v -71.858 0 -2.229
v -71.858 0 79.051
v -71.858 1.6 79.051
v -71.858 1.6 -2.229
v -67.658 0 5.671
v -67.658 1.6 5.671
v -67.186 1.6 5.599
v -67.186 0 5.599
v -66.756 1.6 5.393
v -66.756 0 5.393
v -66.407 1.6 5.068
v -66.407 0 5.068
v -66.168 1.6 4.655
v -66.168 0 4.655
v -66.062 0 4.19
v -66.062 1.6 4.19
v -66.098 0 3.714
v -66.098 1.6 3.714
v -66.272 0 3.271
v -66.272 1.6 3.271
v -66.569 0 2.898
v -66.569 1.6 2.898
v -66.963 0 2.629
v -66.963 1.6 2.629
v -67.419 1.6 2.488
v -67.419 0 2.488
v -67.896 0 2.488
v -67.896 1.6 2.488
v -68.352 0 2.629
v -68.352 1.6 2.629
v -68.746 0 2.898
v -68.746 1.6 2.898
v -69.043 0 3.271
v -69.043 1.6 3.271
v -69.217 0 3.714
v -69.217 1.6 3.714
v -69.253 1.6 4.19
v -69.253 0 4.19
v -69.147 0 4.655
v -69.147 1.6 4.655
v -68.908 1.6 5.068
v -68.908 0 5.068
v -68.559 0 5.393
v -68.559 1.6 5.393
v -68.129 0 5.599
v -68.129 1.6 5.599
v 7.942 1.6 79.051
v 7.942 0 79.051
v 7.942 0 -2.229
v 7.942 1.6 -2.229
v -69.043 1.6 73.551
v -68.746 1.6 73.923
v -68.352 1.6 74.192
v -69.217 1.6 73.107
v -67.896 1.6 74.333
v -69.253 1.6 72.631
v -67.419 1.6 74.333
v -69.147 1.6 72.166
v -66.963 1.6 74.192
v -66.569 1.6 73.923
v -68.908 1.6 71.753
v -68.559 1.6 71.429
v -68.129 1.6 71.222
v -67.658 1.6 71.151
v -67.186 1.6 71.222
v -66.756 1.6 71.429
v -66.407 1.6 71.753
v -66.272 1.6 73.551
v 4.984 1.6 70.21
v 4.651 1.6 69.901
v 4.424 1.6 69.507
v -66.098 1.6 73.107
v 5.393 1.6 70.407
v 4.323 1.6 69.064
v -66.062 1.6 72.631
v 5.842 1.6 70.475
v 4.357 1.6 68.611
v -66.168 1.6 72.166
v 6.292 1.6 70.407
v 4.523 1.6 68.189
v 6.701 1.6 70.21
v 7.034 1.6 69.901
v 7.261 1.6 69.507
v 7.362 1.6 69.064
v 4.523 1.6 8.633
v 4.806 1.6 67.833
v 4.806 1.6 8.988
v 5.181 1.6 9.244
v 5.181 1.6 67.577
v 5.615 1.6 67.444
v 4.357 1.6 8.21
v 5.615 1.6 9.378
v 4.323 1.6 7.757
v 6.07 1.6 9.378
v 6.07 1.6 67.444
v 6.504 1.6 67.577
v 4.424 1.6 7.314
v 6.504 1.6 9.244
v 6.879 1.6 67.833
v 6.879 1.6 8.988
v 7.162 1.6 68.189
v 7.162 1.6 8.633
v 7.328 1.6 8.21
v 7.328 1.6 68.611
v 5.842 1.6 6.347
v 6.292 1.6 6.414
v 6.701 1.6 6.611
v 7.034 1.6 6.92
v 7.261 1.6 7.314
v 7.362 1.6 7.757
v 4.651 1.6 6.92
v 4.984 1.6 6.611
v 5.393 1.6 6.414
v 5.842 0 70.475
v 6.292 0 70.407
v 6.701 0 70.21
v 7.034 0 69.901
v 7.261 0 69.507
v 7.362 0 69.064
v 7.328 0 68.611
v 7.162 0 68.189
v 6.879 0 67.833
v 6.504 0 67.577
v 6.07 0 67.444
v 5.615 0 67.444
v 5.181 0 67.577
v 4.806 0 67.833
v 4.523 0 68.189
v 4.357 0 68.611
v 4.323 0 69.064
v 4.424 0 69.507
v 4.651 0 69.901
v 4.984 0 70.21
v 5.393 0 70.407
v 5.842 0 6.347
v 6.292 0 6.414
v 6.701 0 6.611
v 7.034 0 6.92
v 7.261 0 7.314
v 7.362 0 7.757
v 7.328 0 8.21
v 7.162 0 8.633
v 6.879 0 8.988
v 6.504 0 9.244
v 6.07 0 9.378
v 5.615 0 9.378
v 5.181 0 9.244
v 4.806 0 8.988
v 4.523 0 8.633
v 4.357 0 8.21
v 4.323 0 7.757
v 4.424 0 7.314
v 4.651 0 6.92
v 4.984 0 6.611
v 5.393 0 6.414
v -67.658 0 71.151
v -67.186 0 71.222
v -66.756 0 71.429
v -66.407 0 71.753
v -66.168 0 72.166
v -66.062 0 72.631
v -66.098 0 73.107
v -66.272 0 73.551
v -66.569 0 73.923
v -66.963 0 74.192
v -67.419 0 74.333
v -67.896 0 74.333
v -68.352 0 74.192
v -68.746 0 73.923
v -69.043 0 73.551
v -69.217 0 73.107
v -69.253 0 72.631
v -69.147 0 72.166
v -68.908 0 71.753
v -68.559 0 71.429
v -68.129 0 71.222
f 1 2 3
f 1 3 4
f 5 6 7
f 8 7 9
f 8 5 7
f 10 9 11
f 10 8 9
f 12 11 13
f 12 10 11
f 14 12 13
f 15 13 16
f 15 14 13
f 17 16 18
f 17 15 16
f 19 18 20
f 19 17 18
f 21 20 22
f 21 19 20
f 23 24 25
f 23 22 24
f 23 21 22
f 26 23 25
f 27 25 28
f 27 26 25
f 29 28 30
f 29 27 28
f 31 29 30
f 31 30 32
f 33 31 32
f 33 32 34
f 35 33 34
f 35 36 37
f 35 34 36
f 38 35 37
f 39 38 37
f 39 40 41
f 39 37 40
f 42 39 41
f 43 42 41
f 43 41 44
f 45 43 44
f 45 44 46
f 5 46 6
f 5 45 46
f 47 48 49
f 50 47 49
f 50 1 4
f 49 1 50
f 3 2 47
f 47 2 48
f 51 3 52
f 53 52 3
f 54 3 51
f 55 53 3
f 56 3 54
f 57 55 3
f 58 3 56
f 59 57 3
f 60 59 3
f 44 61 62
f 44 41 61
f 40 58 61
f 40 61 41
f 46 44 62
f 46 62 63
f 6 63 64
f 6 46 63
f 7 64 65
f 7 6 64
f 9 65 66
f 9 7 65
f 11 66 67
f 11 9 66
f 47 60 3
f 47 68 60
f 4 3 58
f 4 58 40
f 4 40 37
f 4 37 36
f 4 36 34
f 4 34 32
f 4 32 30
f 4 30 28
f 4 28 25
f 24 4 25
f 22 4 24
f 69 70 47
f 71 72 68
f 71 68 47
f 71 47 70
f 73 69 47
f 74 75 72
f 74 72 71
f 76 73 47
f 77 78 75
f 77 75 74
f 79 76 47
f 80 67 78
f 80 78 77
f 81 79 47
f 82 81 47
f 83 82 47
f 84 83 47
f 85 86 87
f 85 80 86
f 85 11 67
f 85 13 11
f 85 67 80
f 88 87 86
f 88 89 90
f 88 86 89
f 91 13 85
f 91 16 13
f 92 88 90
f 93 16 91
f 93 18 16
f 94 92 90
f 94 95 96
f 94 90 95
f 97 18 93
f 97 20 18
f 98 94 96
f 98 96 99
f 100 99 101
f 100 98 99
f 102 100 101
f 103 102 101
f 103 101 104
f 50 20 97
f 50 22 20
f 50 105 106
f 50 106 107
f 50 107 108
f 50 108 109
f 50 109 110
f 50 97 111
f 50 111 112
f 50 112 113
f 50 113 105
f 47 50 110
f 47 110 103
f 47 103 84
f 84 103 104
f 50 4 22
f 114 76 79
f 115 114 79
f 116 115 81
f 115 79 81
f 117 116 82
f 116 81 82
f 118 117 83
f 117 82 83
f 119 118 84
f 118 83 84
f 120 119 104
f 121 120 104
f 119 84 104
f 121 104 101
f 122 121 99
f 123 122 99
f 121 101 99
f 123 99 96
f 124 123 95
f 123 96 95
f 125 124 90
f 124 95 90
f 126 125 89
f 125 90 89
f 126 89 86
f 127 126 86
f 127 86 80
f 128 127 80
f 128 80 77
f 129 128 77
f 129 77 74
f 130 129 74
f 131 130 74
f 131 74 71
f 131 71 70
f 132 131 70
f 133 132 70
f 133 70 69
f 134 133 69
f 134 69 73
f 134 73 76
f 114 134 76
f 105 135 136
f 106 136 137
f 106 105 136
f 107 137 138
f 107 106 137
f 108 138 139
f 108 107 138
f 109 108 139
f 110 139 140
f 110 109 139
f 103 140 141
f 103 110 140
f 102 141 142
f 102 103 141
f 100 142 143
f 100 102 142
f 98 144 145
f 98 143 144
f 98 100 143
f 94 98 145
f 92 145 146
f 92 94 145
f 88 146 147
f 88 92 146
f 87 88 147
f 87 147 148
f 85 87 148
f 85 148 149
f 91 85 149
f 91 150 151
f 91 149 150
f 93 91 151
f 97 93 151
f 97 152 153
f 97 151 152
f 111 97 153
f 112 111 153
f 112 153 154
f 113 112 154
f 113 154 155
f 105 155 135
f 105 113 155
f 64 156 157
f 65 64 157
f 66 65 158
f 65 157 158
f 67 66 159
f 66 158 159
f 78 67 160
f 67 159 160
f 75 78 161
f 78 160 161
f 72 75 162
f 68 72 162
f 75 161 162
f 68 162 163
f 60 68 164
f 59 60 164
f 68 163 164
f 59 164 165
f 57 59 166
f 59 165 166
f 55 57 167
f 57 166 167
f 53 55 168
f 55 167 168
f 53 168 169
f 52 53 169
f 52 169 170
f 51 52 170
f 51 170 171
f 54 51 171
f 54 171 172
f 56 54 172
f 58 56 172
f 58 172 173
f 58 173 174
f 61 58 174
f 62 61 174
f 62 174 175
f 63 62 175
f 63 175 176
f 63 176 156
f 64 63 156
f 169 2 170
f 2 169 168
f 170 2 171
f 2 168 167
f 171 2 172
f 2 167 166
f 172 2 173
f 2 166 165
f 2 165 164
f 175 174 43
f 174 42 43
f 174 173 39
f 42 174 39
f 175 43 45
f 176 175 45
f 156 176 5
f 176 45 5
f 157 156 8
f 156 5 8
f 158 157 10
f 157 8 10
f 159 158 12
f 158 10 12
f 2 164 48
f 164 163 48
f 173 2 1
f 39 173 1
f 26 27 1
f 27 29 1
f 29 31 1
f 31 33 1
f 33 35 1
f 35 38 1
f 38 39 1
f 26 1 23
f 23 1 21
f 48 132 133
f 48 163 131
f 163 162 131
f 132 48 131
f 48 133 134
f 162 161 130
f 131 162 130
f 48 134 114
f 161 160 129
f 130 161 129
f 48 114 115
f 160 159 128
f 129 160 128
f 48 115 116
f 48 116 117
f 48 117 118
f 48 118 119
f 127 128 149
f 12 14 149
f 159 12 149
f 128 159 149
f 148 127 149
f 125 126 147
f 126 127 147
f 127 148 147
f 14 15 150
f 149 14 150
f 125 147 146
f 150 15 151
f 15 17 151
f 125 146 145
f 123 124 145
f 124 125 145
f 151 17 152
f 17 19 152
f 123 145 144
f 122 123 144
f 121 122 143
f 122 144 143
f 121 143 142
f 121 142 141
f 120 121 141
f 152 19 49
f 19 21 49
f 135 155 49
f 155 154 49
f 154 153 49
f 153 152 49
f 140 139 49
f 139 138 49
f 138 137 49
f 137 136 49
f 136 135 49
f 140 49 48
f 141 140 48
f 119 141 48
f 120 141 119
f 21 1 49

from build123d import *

# Parameters (mm, degrees)
SKETCH1_W           = 79.799999912
SKETCH1_H           = 81.28
BOSS_EXTRUDE1_DEPTH = 1.600000102
SKETCH2_R           = 1.524
CUT_EXTRUDE1_DEPTH  = 107.841239355
SKETCH4_R           = 1.6
CUT_EXTRUDE2_DEPTH  = 107.841239355


with BuildPart() as part:
    # Sketch1 → Boss-Extrude1 (new body)
    with BuildSketch(Plane(origin=(0, 0, 0), x_dir=(1, 0, 0), z_dir=(0, 1, 0))):
        with Locations((-31.957523467, -38.410532915)):
            Rectangle(SKETCH1_W, SKETCH1_H)
    extrude(amount=BOSS_EXTRUDE1_DEPTH)

    # Sketch2 → Cut-Extrude1 (cut, through all)
    with BuildSketch(Plane(origin=(0, 1.600000102, 0), x_dir=(1, 0, 0), z_dir=(0, 1, 0))):
        with Locations(Location((5.842476489, -68.950532915, 0), (0, 0, 270))):
            Circle(SKETCH2_R)
    cut_extrude1 = extrude(amount=-CUT_EXTRUDE1_DEPTH, mode=Mode.SUBTRACT)

    # Mirror1: Cut-Extrude1 across plane
    add(cut_extrude1.mirror(Plane.XY.offset(38.410532915)), mode=Mode.SUBTRACT)

    # Sketch4 → Cut-Extrude2 (cut, through all)
    with BuildSketch(Plane.XZ):
        with Locations(Location((-67.657528223, 72.750532915, 0), (0, 0, 270))):
            Circle(SKETCH4_R)
    cut_extrude2 = extrude(amount=-CUT_EXTRUDE2_DEPTH, mode=Mode.SUBTRACT)

    # Mirror2: Cut-Extrude2 across plane
    add(cut_extrude2.mirror(Plane.XY.offset(38.410532915)), mode=Mode.SUBTRACT)


solid = part.part
